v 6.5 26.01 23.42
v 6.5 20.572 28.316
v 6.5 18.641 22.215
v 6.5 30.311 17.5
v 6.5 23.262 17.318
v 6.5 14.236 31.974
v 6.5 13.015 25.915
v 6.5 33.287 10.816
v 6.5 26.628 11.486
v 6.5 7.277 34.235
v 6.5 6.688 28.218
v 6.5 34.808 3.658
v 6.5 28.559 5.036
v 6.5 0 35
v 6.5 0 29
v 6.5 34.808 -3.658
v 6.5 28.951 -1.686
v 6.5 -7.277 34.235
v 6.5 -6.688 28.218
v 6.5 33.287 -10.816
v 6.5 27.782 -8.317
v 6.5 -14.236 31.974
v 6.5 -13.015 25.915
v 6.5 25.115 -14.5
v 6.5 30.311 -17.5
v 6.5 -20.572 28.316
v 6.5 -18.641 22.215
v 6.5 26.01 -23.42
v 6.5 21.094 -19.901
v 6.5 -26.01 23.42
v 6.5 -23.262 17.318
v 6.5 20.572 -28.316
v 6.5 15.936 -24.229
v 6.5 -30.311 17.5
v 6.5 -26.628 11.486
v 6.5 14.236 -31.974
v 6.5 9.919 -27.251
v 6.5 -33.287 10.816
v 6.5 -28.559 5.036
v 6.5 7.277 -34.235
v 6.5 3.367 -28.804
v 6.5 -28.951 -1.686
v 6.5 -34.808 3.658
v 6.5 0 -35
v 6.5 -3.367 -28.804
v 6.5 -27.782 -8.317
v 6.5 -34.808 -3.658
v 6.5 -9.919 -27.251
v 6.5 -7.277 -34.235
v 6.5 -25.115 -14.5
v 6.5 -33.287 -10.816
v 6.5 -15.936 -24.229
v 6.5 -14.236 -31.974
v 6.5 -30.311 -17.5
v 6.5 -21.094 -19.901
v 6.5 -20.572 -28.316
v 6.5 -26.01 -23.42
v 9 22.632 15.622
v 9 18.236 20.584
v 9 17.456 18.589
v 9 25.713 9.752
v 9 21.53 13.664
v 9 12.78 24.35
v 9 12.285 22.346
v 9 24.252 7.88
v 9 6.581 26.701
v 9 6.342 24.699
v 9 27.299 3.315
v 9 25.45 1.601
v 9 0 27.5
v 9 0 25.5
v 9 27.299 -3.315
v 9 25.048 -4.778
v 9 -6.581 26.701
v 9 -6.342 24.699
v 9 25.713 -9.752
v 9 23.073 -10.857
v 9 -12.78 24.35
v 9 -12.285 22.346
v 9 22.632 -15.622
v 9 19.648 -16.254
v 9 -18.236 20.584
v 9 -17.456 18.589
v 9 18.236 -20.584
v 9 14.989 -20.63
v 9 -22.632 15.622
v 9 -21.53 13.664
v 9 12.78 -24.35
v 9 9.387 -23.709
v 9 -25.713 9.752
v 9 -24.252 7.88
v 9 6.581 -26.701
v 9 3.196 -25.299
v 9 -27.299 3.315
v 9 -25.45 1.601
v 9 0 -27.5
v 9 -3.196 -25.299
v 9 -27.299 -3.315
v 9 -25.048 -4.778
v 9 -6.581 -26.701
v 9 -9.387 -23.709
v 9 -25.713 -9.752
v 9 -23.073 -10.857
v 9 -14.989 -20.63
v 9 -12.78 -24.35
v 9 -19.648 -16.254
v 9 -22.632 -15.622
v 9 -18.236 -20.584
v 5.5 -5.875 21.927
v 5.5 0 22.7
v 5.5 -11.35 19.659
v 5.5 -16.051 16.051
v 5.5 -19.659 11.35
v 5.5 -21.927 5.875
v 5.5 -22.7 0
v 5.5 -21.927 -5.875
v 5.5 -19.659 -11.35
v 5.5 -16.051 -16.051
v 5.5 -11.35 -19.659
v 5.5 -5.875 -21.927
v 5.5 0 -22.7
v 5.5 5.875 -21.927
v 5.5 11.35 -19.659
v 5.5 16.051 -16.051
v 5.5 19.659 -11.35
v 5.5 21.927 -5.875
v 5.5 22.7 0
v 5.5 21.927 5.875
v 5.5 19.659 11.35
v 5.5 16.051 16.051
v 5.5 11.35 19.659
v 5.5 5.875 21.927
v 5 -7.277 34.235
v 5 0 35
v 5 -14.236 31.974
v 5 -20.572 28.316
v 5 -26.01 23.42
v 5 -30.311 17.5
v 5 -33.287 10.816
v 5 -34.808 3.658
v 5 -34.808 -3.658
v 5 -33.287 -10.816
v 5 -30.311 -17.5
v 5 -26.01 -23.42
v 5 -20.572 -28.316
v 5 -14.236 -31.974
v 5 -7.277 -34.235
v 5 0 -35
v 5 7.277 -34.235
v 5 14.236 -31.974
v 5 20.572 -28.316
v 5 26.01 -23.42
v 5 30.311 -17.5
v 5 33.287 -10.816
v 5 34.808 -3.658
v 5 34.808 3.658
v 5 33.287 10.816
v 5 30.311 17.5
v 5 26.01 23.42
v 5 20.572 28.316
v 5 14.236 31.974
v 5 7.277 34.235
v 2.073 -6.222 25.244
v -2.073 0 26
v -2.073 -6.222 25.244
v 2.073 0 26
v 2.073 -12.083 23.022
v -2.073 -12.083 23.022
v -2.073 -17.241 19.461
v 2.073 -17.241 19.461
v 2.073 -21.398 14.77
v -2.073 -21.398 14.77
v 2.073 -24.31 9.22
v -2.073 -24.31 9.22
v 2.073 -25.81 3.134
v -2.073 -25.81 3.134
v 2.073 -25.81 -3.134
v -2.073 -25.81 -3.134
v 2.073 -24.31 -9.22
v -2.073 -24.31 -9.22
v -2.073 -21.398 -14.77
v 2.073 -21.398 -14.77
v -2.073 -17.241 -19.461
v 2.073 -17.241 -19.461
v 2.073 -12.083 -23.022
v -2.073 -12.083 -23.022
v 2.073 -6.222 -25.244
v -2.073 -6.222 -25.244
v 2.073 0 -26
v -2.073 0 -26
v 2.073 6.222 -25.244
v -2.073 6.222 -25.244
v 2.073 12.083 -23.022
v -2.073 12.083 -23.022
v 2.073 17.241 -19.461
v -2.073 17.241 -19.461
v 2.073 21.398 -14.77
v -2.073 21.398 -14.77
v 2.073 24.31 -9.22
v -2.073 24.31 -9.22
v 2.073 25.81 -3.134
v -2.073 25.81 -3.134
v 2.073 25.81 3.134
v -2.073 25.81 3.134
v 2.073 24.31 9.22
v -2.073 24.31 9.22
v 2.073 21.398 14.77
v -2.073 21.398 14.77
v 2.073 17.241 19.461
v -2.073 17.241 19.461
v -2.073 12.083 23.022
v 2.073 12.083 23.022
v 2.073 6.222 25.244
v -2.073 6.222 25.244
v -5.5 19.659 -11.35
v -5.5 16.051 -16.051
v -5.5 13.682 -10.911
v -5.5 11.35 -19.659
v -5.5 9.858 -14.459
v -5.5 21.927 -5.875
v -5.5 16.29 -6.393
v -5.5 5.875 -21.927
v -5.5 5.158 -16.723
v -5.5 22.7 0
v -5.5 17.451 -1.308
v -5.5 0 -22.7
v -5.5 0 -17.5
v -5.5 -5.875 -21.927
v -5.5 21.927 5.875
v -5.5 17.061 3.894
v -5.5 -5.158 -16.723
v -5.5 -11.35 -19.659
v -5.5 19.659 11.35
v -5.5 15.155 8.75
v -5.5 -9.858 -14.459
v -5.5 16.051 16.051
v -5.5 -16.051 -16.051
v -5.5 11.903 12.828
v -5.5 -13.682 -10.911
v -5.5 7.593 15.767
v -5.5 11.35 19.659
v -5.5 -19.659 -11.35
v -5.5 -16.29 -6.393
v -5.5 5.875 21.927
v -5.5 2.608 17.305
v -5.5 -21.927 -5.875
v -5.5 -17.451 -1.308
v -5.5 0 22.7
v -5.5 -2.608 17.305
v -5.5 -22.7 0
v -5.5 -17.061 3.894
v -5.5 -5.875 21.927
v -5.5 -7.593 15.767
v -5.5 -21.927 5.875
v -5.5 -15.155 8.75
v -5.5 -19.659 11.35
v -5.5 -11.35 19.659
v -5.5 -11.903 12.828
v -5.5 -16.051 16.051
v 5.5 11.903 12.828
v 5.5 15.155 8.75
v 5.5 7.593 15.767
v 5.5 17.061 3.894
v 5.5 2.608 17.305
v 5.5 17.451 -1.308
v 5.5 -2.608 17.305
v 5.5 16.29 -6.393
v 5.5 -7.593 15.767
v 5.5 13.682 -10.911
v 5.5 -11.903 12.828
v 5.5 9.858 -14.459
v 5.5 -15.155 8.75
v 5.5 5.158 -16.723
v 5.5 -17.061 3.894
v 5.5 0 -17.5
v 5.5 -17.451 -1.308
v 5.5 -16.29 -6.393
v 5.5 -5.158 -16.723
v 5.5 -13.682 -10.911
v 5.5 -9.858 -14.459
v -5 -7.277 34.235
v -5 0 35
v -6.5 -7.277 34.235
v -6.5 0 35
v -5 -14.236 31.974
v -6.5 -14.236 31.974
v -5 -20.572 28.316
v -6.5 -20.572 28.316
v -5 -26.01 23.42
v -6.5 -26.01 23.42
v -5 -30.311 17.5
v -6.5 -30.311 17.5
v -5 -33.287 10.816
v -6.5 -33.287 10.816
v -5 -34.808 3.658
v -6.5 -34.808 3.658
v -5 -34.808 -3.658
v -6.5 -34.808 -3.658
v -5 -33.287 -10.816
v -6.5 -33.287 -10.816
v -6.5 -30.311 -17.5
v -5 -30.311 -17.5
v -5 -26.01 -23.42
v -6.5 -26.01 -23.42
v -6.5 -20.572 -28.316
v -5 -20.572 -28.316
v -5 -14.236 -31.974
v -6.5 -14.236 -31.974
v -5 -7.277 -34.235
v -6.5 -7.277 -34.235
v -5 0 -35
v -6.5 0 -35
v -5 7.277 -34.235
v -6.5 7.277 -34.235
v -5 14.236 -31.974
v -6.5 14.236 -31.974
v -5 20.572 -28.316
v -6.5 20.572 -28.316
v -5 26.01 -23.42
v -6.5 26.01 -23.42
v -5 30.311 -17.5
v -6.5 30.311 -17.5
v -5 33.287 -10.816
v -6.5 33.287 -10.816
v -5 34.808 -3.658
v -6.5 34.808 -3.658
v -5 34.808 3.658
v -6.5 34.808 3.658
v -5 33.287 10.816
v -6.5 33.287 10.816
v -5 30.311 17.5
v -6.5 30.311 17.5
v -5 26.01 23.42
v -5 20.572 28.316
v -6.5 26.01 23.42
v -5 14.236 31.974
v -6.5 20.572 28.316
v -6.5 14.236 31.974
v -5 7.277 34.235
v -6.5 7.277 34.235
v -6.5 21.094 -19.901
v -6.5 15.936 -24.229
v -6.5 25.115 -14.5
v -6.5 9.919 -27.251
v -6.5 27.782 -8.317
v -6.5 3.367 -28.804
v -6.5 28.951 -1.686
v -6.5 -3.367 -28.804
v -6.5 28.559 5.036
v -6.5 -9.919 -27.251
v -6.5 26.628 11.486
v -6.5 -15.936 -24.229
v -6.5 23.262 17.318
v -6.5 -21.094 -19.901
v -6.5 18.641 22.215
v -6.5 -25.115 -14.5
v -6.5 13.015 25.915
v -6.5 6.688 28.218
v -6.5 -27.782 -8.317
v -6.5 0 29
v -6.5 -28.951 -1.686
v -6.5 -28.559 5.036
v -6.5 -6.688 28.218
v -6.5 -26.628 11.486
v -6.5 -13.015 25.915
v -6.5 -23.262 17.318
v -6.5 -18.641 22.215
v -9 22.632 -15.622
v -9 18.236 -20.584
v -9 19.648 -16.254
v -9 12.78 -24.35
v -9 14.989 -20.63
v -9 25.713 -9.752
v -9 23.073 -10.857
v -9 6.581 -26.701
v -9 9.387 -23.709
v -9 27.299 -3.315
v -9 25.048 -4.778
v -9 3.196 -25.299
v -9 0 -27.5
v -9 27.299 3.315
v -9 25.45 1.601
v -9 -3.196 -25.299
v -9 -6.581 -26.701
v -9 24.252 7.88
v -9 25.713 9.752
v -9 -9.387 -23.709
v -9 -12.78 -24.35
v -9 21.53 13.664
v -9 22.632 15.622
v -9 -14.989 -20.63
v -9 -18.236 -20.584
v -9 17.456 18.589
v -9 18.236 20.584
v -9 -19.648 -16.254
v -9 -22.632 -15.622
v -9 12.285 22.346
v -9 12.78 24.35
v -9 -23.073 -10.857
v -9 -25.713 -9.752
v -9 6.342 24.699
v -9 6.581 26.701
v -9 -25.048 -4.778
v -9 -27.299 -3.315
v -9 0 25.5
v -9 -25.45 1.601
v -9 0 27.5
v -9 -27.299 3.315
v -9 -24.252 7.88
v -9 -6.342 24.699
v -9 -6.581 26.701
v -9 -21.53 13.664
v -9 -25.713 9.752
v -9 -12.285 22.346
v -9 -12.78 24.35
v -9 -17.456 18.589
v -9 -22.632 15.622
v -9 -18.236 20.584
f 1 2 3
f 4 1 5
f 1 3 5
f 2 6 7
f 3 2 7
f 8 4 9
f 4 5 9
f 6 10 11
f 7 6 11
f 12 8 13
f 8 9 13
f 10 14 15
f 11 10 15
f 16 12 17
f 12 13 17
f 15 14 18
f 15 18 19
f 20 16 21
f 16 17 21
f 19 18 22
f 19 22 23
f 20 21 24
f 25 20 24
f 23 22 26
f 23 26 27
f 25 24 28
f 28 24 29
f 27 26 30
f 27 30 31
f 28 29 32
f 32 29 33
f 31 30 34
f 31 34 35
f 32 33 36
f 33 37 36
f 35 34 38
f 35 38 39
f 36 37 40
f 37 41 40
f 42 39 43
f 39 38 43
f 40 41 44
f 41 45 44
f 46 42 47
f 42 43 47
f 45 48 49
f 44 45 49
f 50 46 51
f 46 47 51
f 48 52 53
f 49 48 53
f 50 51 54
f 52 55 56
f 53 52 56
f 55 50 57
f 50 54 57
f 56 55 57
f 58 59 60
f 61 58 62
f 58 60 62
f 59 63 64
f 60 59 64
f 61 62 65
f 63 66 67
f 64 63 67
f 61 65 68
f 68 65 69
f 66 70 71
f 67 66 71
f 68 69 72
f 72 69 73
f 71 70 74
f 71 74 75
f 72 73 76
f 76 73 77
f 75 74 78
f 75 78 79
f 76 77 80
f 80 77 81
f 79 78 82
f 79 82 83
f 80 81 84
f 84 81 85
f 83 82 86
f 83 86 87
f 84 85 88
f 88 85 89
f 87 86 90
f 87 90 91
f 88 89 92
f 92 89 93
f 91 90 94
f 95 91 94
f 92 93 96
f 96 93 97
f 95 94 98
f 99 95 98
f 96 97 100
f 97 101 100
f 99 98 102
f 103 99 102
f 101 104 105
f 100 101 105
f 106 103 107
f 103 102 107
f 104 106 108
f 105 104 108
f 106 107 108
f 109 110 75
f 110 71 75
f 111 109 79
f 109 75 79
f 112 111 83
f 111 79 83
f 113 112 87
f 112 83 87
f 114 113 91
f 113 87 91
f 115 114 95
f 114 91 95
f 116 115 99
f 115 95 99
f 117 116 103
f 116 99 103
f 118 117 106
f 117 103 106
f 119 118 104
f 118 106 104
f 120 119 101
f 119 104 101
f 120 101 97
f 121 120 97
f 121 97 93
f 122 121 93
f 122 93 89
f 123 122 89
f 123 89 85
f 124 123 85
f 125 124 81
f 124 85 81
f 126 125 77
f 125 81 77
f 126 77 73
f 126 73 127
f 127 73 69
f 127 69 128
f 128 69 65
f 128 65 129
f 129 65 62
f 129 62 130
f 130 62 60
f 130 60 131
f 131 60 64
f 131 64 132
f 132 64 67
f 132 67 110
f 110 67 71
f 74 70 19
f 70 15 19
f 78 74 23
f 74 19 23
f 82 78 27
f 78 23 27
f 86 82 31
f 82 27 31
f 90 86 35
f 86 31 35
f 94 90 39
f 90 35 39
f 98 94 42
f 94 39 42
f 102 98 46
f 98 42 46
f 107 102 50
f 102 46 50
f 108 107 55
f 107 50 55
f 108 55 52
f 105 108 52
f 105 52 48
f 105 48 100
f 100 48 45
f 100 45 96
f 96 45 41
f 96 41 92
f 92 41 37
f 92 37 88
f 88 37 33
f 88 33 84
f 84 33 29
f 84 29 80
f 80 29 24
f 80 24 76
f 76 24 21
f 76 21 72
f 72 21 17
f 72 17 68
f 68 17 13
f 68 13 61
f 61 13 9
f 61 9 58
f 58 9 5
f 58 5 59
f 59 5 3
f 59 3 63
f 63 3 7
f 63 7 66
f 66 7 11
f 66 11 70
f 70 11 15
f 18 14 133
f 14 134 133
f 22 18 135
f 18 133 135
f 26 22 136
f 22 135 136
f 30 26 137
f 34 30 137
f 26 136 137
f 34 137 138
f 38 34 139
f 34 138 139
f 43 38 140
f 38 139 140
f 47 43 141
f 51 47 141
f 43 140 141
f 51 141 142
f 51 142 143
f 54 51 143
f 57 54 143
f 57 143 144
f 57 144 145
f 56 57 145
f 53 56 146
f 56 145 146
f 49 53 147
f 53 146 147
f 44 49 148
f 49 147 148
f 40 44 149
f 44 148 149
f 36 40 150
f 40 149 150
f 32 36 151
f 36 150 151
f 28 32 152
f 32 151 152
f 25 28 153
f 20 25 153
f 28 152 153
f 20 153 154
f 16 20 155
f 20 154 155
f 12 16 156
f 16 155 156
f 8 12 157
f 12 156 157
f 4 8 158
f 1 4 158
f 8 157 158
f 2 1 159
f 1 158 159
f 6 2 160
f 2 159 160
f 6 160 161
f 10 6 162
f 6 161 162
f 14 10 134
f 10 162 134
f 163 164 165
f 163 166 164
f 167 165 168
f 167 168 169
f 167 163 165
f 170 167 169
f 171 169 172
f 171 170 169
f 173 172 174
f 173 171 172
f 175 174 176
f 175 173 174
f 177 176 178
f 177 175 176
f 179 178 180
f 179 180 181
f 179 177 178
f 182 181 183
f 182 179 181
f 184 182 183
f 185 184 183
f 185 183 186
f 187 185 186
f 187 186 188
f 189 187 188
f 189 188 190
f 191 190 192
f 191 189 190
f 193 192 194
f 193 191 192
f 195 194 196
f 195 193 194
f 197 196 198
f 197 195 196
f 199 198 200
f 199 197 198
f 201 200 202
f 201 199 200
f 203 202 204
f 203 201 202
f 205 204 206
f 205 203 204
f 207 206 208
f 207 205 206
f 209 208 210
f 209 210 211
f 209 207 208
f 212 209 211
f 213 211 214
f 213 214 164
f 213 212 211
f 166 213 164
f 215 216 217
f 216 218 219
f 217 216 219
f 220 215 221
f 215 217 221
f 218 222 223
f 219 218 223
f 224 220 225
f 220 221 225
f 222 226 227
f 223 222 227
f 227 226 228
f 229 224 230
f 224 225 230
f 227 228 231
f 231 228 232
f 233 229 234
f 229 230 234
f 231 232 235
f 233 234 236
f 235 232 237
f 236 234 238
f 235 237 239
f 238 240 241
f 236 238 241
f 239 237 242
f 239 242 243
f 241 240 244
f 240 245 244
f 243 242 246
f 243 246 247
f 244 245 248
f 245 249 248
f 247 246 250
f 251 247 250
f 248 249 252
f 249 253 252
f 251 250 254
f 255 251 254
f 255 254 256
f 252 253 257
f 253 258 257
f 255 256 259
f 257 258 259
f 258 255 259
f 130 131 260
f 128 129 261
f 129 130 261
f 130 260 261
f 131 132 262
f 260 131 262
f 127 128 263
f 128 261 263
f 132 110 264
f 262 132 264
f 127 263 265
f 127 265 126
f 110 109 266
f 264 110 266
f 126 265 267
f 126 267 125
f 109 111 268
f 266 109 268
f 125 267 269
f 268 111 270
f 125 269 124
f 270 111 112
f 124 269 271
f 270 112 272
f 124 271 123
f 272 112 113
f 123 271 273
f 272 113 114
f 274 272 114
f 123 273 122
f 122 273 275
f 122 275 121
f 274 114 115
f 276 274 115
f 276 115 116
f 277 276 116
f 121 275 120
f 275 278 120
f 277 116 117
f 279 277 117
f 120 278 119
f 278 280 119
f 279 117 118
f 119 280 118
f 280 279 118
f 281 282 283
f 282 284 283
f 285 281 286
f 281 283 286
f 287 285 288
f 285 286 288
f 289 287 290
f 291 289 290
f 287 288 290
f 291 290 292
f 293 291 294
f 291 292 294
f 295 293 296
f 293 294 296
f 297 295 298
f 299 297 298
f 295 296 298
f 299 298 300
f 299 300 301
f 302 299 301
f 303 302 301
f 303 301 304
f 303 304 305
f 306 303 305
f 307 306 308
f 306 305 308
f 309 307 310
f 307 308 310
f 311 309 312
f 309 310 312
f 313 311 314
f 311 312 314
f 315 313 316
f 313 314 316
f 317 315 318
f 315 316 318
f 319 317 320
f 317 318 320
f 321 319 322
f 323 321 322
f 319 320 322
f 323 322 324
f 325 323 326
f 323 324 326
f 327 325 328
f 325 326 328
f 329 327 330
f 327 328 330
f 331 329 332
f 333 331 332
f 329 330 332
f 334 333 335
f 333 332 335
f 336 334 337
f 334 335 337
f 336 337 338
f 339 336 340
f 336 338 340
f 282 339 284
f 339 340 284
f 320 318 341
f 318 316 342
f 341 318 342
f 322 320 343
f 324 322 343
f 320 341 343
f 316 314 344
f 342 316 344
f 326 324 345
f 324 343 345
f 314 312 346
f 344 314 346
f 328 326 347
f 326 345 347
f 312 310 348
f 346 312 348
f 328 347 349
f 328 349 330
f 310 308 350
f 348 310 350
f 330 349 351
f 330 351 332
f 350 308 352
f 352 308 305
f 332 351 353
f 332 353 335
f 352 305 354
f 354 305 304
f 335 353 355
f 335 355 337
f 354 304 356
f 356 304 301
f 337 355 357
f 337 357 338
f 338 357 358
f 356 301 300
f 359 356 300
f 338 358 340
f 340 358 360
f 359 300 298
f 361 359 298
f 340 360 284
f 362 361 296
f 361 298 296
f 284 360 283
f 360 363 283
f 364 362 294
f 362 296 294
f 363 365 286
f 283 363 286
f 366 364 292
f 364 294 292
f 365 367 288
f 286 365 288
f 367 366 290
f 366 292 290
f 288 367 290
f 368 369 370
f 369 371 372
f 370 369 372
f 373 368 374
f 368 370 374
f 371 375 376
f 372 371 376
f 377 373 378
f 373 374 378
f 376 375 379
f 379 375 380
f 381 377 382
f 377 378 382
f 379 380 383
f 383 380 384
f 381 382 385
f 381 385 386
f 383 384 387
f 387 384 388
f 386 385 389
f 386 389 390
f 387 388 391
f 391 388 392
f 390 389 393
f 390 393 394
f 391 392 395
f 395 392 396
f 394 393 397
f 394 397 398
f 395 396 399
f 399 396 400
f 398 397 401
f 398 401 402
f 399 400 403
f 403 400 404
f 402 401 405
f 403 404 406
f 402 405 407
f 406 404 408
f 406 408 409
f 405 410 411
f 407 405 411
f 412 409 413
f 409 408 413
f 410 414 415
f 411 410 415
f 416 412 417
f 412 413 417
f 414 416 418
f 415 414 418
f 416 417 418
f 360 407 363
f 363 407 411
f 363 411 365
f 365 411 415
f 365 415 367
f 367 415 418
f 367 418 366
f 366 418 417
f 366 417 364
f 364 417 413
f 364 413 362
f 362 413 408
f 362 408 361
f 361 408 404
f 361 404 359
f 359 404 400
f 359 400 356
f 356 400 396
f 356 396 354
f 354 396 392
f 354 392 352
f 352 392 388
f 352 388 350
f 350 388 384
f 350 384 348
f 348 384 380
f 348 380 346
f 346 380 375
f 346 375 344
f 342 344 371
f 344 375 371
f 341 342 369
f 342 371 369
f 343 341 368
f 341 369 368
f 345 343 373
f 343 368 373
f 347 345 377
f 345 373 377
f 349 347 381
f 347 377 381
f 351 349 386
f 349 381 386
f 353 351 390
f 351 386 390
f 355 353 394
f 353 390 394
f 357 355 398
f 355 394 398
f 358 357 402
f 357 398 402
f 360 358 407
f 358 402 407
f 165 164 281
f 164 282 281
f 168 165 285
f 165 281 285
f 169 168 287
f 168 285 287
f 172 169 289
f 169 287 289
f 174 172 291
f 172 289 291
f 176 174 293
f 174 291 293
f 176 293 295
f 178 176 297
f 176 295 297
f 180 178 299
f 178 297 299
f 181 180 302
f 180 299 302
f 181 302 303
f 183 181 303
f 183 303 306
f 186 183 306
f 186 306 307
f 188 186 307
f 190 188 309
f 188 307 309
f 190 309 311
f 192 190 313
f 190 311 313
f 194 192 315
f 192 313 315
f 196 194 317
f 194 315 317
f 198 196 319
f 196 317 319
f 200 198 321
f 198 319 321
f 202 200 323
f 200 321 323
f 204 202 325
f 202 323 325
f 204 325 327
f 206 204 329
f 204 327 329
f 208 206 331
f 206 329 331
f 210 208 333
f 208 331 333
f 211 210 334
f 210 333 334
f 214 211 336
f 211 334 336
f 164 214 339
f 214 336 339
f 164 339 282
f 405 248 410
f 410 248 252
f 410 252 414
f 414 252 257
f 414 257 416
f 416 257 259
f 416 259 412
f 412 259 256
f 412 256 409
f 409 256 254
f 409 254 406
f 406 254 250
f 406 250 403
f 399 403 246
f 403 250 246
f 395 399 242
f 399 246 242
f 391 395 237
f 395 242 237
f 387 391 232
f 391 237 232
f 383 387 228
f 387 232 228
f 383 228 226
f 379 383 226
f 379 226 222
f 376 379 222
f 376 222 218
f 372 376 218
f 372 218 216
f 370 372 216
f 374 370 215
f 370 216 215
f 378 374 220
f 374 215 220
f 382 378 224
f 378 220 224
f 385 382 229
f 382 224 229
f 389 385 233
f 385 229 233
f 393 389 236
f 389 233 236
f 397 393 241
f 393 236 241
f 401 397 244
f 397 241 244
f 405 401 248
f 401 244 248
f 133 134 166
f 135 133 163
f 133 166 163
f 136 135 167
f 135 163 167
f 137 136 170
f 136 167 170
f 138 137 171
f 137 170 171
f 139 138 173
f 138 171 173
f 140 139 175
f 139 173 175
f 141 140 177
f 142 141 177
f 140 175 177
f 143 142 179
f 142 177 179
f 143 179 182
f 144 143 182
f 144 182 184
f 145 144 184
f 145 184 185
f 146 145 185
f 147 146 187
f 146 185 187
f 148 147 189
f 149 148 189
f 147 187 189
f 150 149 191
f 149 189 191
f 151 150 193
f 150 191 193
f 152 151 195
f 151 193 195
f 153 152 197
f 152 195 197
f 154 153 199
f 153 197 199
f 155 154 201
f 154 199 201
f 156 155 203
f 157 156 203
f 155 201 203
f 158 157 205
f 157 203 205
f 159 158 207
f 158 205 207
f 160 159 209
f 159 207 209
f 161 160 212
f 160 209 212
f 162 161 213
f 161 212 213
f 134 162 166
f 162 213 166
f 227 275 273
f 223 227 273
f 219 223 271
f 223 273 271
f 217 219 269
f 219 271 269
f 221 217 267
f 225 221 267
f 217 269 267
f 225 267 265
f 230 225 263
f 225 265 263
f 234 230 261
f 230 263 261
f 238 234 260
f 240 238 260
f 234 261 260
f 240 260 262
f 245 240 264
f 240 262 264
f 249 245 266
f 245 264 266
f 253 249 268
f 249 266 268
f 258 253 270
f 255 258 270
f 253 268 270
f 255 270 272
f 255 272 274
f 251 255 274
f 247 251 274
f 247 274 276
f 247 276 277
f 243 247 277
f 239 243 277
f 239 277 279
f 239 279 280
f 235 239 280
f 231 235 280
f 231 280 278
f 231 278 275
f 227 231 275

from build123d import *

# Parameters (mm, degrees)
SKETCH_2_R          = 17.5
CUT_EXTRUDE_1_DEPTH = 52.577611422
SKETCH_4_W          = 5.67471706
SKETCH_4_H          = 4.873840026


with BuildPart() as part:
    # Эскиз1 → Повернуть1 (revolve)
    with BuildSketch(Plane.XY, mode=Mode.PRIVATE) as revolve_1_sk:
        Polygon((5.5, 0), (5.5, 22.7), (9, 25.5), (9, 27.5), (6.5, 29), (6.5, 35), (5, 35), (1, 22.7), (-1, 22.7), (-5, 35), (-6.5, 35), (-6.5, 29), (-9, 27.5), (-9, 25.5), (-5.5, 22.7), (-5.5, 0), align=None)
    revolve(revolve_1_sk.sketch.rotate(Axis((-55.549199464, 0, 0), (1, 0, 0)), 90), axis=Axis((-55.549199464, 0, 0), (1, 0, 0)))

    # Эскиз2 → Вырез-Вытянуть1 (cut, through all)
    with BuildSketch(Plane(origin=(5.5, 0, 0), x_dir=(0, 0, -1), z_dir=(1, 0, 0))):
        Circle(SKETCH_2_R)
    extrude(amount=-CUT_EXTRUDE_1_DEPTH, mode=Mode.SUBTRACT)

    # Эскиз4 → Повернуть2 (revolve)
    with BuildSketch(Plane.XY, mode=Mode.PRIVATE) as revolve_2_sk:
        with Locations((0, 23.563079987)):
            Rectangle(SKETCH_4_W, SKETCH_4_H)
    revolve(revolve_2_sk.sketch.rotate(Axis((-55.549199464, 0, 0), (1, 0, 0)), 90), axis=Axis((-55.549199464, 0, 0), (1, 0, 0)))


solid = part.part
